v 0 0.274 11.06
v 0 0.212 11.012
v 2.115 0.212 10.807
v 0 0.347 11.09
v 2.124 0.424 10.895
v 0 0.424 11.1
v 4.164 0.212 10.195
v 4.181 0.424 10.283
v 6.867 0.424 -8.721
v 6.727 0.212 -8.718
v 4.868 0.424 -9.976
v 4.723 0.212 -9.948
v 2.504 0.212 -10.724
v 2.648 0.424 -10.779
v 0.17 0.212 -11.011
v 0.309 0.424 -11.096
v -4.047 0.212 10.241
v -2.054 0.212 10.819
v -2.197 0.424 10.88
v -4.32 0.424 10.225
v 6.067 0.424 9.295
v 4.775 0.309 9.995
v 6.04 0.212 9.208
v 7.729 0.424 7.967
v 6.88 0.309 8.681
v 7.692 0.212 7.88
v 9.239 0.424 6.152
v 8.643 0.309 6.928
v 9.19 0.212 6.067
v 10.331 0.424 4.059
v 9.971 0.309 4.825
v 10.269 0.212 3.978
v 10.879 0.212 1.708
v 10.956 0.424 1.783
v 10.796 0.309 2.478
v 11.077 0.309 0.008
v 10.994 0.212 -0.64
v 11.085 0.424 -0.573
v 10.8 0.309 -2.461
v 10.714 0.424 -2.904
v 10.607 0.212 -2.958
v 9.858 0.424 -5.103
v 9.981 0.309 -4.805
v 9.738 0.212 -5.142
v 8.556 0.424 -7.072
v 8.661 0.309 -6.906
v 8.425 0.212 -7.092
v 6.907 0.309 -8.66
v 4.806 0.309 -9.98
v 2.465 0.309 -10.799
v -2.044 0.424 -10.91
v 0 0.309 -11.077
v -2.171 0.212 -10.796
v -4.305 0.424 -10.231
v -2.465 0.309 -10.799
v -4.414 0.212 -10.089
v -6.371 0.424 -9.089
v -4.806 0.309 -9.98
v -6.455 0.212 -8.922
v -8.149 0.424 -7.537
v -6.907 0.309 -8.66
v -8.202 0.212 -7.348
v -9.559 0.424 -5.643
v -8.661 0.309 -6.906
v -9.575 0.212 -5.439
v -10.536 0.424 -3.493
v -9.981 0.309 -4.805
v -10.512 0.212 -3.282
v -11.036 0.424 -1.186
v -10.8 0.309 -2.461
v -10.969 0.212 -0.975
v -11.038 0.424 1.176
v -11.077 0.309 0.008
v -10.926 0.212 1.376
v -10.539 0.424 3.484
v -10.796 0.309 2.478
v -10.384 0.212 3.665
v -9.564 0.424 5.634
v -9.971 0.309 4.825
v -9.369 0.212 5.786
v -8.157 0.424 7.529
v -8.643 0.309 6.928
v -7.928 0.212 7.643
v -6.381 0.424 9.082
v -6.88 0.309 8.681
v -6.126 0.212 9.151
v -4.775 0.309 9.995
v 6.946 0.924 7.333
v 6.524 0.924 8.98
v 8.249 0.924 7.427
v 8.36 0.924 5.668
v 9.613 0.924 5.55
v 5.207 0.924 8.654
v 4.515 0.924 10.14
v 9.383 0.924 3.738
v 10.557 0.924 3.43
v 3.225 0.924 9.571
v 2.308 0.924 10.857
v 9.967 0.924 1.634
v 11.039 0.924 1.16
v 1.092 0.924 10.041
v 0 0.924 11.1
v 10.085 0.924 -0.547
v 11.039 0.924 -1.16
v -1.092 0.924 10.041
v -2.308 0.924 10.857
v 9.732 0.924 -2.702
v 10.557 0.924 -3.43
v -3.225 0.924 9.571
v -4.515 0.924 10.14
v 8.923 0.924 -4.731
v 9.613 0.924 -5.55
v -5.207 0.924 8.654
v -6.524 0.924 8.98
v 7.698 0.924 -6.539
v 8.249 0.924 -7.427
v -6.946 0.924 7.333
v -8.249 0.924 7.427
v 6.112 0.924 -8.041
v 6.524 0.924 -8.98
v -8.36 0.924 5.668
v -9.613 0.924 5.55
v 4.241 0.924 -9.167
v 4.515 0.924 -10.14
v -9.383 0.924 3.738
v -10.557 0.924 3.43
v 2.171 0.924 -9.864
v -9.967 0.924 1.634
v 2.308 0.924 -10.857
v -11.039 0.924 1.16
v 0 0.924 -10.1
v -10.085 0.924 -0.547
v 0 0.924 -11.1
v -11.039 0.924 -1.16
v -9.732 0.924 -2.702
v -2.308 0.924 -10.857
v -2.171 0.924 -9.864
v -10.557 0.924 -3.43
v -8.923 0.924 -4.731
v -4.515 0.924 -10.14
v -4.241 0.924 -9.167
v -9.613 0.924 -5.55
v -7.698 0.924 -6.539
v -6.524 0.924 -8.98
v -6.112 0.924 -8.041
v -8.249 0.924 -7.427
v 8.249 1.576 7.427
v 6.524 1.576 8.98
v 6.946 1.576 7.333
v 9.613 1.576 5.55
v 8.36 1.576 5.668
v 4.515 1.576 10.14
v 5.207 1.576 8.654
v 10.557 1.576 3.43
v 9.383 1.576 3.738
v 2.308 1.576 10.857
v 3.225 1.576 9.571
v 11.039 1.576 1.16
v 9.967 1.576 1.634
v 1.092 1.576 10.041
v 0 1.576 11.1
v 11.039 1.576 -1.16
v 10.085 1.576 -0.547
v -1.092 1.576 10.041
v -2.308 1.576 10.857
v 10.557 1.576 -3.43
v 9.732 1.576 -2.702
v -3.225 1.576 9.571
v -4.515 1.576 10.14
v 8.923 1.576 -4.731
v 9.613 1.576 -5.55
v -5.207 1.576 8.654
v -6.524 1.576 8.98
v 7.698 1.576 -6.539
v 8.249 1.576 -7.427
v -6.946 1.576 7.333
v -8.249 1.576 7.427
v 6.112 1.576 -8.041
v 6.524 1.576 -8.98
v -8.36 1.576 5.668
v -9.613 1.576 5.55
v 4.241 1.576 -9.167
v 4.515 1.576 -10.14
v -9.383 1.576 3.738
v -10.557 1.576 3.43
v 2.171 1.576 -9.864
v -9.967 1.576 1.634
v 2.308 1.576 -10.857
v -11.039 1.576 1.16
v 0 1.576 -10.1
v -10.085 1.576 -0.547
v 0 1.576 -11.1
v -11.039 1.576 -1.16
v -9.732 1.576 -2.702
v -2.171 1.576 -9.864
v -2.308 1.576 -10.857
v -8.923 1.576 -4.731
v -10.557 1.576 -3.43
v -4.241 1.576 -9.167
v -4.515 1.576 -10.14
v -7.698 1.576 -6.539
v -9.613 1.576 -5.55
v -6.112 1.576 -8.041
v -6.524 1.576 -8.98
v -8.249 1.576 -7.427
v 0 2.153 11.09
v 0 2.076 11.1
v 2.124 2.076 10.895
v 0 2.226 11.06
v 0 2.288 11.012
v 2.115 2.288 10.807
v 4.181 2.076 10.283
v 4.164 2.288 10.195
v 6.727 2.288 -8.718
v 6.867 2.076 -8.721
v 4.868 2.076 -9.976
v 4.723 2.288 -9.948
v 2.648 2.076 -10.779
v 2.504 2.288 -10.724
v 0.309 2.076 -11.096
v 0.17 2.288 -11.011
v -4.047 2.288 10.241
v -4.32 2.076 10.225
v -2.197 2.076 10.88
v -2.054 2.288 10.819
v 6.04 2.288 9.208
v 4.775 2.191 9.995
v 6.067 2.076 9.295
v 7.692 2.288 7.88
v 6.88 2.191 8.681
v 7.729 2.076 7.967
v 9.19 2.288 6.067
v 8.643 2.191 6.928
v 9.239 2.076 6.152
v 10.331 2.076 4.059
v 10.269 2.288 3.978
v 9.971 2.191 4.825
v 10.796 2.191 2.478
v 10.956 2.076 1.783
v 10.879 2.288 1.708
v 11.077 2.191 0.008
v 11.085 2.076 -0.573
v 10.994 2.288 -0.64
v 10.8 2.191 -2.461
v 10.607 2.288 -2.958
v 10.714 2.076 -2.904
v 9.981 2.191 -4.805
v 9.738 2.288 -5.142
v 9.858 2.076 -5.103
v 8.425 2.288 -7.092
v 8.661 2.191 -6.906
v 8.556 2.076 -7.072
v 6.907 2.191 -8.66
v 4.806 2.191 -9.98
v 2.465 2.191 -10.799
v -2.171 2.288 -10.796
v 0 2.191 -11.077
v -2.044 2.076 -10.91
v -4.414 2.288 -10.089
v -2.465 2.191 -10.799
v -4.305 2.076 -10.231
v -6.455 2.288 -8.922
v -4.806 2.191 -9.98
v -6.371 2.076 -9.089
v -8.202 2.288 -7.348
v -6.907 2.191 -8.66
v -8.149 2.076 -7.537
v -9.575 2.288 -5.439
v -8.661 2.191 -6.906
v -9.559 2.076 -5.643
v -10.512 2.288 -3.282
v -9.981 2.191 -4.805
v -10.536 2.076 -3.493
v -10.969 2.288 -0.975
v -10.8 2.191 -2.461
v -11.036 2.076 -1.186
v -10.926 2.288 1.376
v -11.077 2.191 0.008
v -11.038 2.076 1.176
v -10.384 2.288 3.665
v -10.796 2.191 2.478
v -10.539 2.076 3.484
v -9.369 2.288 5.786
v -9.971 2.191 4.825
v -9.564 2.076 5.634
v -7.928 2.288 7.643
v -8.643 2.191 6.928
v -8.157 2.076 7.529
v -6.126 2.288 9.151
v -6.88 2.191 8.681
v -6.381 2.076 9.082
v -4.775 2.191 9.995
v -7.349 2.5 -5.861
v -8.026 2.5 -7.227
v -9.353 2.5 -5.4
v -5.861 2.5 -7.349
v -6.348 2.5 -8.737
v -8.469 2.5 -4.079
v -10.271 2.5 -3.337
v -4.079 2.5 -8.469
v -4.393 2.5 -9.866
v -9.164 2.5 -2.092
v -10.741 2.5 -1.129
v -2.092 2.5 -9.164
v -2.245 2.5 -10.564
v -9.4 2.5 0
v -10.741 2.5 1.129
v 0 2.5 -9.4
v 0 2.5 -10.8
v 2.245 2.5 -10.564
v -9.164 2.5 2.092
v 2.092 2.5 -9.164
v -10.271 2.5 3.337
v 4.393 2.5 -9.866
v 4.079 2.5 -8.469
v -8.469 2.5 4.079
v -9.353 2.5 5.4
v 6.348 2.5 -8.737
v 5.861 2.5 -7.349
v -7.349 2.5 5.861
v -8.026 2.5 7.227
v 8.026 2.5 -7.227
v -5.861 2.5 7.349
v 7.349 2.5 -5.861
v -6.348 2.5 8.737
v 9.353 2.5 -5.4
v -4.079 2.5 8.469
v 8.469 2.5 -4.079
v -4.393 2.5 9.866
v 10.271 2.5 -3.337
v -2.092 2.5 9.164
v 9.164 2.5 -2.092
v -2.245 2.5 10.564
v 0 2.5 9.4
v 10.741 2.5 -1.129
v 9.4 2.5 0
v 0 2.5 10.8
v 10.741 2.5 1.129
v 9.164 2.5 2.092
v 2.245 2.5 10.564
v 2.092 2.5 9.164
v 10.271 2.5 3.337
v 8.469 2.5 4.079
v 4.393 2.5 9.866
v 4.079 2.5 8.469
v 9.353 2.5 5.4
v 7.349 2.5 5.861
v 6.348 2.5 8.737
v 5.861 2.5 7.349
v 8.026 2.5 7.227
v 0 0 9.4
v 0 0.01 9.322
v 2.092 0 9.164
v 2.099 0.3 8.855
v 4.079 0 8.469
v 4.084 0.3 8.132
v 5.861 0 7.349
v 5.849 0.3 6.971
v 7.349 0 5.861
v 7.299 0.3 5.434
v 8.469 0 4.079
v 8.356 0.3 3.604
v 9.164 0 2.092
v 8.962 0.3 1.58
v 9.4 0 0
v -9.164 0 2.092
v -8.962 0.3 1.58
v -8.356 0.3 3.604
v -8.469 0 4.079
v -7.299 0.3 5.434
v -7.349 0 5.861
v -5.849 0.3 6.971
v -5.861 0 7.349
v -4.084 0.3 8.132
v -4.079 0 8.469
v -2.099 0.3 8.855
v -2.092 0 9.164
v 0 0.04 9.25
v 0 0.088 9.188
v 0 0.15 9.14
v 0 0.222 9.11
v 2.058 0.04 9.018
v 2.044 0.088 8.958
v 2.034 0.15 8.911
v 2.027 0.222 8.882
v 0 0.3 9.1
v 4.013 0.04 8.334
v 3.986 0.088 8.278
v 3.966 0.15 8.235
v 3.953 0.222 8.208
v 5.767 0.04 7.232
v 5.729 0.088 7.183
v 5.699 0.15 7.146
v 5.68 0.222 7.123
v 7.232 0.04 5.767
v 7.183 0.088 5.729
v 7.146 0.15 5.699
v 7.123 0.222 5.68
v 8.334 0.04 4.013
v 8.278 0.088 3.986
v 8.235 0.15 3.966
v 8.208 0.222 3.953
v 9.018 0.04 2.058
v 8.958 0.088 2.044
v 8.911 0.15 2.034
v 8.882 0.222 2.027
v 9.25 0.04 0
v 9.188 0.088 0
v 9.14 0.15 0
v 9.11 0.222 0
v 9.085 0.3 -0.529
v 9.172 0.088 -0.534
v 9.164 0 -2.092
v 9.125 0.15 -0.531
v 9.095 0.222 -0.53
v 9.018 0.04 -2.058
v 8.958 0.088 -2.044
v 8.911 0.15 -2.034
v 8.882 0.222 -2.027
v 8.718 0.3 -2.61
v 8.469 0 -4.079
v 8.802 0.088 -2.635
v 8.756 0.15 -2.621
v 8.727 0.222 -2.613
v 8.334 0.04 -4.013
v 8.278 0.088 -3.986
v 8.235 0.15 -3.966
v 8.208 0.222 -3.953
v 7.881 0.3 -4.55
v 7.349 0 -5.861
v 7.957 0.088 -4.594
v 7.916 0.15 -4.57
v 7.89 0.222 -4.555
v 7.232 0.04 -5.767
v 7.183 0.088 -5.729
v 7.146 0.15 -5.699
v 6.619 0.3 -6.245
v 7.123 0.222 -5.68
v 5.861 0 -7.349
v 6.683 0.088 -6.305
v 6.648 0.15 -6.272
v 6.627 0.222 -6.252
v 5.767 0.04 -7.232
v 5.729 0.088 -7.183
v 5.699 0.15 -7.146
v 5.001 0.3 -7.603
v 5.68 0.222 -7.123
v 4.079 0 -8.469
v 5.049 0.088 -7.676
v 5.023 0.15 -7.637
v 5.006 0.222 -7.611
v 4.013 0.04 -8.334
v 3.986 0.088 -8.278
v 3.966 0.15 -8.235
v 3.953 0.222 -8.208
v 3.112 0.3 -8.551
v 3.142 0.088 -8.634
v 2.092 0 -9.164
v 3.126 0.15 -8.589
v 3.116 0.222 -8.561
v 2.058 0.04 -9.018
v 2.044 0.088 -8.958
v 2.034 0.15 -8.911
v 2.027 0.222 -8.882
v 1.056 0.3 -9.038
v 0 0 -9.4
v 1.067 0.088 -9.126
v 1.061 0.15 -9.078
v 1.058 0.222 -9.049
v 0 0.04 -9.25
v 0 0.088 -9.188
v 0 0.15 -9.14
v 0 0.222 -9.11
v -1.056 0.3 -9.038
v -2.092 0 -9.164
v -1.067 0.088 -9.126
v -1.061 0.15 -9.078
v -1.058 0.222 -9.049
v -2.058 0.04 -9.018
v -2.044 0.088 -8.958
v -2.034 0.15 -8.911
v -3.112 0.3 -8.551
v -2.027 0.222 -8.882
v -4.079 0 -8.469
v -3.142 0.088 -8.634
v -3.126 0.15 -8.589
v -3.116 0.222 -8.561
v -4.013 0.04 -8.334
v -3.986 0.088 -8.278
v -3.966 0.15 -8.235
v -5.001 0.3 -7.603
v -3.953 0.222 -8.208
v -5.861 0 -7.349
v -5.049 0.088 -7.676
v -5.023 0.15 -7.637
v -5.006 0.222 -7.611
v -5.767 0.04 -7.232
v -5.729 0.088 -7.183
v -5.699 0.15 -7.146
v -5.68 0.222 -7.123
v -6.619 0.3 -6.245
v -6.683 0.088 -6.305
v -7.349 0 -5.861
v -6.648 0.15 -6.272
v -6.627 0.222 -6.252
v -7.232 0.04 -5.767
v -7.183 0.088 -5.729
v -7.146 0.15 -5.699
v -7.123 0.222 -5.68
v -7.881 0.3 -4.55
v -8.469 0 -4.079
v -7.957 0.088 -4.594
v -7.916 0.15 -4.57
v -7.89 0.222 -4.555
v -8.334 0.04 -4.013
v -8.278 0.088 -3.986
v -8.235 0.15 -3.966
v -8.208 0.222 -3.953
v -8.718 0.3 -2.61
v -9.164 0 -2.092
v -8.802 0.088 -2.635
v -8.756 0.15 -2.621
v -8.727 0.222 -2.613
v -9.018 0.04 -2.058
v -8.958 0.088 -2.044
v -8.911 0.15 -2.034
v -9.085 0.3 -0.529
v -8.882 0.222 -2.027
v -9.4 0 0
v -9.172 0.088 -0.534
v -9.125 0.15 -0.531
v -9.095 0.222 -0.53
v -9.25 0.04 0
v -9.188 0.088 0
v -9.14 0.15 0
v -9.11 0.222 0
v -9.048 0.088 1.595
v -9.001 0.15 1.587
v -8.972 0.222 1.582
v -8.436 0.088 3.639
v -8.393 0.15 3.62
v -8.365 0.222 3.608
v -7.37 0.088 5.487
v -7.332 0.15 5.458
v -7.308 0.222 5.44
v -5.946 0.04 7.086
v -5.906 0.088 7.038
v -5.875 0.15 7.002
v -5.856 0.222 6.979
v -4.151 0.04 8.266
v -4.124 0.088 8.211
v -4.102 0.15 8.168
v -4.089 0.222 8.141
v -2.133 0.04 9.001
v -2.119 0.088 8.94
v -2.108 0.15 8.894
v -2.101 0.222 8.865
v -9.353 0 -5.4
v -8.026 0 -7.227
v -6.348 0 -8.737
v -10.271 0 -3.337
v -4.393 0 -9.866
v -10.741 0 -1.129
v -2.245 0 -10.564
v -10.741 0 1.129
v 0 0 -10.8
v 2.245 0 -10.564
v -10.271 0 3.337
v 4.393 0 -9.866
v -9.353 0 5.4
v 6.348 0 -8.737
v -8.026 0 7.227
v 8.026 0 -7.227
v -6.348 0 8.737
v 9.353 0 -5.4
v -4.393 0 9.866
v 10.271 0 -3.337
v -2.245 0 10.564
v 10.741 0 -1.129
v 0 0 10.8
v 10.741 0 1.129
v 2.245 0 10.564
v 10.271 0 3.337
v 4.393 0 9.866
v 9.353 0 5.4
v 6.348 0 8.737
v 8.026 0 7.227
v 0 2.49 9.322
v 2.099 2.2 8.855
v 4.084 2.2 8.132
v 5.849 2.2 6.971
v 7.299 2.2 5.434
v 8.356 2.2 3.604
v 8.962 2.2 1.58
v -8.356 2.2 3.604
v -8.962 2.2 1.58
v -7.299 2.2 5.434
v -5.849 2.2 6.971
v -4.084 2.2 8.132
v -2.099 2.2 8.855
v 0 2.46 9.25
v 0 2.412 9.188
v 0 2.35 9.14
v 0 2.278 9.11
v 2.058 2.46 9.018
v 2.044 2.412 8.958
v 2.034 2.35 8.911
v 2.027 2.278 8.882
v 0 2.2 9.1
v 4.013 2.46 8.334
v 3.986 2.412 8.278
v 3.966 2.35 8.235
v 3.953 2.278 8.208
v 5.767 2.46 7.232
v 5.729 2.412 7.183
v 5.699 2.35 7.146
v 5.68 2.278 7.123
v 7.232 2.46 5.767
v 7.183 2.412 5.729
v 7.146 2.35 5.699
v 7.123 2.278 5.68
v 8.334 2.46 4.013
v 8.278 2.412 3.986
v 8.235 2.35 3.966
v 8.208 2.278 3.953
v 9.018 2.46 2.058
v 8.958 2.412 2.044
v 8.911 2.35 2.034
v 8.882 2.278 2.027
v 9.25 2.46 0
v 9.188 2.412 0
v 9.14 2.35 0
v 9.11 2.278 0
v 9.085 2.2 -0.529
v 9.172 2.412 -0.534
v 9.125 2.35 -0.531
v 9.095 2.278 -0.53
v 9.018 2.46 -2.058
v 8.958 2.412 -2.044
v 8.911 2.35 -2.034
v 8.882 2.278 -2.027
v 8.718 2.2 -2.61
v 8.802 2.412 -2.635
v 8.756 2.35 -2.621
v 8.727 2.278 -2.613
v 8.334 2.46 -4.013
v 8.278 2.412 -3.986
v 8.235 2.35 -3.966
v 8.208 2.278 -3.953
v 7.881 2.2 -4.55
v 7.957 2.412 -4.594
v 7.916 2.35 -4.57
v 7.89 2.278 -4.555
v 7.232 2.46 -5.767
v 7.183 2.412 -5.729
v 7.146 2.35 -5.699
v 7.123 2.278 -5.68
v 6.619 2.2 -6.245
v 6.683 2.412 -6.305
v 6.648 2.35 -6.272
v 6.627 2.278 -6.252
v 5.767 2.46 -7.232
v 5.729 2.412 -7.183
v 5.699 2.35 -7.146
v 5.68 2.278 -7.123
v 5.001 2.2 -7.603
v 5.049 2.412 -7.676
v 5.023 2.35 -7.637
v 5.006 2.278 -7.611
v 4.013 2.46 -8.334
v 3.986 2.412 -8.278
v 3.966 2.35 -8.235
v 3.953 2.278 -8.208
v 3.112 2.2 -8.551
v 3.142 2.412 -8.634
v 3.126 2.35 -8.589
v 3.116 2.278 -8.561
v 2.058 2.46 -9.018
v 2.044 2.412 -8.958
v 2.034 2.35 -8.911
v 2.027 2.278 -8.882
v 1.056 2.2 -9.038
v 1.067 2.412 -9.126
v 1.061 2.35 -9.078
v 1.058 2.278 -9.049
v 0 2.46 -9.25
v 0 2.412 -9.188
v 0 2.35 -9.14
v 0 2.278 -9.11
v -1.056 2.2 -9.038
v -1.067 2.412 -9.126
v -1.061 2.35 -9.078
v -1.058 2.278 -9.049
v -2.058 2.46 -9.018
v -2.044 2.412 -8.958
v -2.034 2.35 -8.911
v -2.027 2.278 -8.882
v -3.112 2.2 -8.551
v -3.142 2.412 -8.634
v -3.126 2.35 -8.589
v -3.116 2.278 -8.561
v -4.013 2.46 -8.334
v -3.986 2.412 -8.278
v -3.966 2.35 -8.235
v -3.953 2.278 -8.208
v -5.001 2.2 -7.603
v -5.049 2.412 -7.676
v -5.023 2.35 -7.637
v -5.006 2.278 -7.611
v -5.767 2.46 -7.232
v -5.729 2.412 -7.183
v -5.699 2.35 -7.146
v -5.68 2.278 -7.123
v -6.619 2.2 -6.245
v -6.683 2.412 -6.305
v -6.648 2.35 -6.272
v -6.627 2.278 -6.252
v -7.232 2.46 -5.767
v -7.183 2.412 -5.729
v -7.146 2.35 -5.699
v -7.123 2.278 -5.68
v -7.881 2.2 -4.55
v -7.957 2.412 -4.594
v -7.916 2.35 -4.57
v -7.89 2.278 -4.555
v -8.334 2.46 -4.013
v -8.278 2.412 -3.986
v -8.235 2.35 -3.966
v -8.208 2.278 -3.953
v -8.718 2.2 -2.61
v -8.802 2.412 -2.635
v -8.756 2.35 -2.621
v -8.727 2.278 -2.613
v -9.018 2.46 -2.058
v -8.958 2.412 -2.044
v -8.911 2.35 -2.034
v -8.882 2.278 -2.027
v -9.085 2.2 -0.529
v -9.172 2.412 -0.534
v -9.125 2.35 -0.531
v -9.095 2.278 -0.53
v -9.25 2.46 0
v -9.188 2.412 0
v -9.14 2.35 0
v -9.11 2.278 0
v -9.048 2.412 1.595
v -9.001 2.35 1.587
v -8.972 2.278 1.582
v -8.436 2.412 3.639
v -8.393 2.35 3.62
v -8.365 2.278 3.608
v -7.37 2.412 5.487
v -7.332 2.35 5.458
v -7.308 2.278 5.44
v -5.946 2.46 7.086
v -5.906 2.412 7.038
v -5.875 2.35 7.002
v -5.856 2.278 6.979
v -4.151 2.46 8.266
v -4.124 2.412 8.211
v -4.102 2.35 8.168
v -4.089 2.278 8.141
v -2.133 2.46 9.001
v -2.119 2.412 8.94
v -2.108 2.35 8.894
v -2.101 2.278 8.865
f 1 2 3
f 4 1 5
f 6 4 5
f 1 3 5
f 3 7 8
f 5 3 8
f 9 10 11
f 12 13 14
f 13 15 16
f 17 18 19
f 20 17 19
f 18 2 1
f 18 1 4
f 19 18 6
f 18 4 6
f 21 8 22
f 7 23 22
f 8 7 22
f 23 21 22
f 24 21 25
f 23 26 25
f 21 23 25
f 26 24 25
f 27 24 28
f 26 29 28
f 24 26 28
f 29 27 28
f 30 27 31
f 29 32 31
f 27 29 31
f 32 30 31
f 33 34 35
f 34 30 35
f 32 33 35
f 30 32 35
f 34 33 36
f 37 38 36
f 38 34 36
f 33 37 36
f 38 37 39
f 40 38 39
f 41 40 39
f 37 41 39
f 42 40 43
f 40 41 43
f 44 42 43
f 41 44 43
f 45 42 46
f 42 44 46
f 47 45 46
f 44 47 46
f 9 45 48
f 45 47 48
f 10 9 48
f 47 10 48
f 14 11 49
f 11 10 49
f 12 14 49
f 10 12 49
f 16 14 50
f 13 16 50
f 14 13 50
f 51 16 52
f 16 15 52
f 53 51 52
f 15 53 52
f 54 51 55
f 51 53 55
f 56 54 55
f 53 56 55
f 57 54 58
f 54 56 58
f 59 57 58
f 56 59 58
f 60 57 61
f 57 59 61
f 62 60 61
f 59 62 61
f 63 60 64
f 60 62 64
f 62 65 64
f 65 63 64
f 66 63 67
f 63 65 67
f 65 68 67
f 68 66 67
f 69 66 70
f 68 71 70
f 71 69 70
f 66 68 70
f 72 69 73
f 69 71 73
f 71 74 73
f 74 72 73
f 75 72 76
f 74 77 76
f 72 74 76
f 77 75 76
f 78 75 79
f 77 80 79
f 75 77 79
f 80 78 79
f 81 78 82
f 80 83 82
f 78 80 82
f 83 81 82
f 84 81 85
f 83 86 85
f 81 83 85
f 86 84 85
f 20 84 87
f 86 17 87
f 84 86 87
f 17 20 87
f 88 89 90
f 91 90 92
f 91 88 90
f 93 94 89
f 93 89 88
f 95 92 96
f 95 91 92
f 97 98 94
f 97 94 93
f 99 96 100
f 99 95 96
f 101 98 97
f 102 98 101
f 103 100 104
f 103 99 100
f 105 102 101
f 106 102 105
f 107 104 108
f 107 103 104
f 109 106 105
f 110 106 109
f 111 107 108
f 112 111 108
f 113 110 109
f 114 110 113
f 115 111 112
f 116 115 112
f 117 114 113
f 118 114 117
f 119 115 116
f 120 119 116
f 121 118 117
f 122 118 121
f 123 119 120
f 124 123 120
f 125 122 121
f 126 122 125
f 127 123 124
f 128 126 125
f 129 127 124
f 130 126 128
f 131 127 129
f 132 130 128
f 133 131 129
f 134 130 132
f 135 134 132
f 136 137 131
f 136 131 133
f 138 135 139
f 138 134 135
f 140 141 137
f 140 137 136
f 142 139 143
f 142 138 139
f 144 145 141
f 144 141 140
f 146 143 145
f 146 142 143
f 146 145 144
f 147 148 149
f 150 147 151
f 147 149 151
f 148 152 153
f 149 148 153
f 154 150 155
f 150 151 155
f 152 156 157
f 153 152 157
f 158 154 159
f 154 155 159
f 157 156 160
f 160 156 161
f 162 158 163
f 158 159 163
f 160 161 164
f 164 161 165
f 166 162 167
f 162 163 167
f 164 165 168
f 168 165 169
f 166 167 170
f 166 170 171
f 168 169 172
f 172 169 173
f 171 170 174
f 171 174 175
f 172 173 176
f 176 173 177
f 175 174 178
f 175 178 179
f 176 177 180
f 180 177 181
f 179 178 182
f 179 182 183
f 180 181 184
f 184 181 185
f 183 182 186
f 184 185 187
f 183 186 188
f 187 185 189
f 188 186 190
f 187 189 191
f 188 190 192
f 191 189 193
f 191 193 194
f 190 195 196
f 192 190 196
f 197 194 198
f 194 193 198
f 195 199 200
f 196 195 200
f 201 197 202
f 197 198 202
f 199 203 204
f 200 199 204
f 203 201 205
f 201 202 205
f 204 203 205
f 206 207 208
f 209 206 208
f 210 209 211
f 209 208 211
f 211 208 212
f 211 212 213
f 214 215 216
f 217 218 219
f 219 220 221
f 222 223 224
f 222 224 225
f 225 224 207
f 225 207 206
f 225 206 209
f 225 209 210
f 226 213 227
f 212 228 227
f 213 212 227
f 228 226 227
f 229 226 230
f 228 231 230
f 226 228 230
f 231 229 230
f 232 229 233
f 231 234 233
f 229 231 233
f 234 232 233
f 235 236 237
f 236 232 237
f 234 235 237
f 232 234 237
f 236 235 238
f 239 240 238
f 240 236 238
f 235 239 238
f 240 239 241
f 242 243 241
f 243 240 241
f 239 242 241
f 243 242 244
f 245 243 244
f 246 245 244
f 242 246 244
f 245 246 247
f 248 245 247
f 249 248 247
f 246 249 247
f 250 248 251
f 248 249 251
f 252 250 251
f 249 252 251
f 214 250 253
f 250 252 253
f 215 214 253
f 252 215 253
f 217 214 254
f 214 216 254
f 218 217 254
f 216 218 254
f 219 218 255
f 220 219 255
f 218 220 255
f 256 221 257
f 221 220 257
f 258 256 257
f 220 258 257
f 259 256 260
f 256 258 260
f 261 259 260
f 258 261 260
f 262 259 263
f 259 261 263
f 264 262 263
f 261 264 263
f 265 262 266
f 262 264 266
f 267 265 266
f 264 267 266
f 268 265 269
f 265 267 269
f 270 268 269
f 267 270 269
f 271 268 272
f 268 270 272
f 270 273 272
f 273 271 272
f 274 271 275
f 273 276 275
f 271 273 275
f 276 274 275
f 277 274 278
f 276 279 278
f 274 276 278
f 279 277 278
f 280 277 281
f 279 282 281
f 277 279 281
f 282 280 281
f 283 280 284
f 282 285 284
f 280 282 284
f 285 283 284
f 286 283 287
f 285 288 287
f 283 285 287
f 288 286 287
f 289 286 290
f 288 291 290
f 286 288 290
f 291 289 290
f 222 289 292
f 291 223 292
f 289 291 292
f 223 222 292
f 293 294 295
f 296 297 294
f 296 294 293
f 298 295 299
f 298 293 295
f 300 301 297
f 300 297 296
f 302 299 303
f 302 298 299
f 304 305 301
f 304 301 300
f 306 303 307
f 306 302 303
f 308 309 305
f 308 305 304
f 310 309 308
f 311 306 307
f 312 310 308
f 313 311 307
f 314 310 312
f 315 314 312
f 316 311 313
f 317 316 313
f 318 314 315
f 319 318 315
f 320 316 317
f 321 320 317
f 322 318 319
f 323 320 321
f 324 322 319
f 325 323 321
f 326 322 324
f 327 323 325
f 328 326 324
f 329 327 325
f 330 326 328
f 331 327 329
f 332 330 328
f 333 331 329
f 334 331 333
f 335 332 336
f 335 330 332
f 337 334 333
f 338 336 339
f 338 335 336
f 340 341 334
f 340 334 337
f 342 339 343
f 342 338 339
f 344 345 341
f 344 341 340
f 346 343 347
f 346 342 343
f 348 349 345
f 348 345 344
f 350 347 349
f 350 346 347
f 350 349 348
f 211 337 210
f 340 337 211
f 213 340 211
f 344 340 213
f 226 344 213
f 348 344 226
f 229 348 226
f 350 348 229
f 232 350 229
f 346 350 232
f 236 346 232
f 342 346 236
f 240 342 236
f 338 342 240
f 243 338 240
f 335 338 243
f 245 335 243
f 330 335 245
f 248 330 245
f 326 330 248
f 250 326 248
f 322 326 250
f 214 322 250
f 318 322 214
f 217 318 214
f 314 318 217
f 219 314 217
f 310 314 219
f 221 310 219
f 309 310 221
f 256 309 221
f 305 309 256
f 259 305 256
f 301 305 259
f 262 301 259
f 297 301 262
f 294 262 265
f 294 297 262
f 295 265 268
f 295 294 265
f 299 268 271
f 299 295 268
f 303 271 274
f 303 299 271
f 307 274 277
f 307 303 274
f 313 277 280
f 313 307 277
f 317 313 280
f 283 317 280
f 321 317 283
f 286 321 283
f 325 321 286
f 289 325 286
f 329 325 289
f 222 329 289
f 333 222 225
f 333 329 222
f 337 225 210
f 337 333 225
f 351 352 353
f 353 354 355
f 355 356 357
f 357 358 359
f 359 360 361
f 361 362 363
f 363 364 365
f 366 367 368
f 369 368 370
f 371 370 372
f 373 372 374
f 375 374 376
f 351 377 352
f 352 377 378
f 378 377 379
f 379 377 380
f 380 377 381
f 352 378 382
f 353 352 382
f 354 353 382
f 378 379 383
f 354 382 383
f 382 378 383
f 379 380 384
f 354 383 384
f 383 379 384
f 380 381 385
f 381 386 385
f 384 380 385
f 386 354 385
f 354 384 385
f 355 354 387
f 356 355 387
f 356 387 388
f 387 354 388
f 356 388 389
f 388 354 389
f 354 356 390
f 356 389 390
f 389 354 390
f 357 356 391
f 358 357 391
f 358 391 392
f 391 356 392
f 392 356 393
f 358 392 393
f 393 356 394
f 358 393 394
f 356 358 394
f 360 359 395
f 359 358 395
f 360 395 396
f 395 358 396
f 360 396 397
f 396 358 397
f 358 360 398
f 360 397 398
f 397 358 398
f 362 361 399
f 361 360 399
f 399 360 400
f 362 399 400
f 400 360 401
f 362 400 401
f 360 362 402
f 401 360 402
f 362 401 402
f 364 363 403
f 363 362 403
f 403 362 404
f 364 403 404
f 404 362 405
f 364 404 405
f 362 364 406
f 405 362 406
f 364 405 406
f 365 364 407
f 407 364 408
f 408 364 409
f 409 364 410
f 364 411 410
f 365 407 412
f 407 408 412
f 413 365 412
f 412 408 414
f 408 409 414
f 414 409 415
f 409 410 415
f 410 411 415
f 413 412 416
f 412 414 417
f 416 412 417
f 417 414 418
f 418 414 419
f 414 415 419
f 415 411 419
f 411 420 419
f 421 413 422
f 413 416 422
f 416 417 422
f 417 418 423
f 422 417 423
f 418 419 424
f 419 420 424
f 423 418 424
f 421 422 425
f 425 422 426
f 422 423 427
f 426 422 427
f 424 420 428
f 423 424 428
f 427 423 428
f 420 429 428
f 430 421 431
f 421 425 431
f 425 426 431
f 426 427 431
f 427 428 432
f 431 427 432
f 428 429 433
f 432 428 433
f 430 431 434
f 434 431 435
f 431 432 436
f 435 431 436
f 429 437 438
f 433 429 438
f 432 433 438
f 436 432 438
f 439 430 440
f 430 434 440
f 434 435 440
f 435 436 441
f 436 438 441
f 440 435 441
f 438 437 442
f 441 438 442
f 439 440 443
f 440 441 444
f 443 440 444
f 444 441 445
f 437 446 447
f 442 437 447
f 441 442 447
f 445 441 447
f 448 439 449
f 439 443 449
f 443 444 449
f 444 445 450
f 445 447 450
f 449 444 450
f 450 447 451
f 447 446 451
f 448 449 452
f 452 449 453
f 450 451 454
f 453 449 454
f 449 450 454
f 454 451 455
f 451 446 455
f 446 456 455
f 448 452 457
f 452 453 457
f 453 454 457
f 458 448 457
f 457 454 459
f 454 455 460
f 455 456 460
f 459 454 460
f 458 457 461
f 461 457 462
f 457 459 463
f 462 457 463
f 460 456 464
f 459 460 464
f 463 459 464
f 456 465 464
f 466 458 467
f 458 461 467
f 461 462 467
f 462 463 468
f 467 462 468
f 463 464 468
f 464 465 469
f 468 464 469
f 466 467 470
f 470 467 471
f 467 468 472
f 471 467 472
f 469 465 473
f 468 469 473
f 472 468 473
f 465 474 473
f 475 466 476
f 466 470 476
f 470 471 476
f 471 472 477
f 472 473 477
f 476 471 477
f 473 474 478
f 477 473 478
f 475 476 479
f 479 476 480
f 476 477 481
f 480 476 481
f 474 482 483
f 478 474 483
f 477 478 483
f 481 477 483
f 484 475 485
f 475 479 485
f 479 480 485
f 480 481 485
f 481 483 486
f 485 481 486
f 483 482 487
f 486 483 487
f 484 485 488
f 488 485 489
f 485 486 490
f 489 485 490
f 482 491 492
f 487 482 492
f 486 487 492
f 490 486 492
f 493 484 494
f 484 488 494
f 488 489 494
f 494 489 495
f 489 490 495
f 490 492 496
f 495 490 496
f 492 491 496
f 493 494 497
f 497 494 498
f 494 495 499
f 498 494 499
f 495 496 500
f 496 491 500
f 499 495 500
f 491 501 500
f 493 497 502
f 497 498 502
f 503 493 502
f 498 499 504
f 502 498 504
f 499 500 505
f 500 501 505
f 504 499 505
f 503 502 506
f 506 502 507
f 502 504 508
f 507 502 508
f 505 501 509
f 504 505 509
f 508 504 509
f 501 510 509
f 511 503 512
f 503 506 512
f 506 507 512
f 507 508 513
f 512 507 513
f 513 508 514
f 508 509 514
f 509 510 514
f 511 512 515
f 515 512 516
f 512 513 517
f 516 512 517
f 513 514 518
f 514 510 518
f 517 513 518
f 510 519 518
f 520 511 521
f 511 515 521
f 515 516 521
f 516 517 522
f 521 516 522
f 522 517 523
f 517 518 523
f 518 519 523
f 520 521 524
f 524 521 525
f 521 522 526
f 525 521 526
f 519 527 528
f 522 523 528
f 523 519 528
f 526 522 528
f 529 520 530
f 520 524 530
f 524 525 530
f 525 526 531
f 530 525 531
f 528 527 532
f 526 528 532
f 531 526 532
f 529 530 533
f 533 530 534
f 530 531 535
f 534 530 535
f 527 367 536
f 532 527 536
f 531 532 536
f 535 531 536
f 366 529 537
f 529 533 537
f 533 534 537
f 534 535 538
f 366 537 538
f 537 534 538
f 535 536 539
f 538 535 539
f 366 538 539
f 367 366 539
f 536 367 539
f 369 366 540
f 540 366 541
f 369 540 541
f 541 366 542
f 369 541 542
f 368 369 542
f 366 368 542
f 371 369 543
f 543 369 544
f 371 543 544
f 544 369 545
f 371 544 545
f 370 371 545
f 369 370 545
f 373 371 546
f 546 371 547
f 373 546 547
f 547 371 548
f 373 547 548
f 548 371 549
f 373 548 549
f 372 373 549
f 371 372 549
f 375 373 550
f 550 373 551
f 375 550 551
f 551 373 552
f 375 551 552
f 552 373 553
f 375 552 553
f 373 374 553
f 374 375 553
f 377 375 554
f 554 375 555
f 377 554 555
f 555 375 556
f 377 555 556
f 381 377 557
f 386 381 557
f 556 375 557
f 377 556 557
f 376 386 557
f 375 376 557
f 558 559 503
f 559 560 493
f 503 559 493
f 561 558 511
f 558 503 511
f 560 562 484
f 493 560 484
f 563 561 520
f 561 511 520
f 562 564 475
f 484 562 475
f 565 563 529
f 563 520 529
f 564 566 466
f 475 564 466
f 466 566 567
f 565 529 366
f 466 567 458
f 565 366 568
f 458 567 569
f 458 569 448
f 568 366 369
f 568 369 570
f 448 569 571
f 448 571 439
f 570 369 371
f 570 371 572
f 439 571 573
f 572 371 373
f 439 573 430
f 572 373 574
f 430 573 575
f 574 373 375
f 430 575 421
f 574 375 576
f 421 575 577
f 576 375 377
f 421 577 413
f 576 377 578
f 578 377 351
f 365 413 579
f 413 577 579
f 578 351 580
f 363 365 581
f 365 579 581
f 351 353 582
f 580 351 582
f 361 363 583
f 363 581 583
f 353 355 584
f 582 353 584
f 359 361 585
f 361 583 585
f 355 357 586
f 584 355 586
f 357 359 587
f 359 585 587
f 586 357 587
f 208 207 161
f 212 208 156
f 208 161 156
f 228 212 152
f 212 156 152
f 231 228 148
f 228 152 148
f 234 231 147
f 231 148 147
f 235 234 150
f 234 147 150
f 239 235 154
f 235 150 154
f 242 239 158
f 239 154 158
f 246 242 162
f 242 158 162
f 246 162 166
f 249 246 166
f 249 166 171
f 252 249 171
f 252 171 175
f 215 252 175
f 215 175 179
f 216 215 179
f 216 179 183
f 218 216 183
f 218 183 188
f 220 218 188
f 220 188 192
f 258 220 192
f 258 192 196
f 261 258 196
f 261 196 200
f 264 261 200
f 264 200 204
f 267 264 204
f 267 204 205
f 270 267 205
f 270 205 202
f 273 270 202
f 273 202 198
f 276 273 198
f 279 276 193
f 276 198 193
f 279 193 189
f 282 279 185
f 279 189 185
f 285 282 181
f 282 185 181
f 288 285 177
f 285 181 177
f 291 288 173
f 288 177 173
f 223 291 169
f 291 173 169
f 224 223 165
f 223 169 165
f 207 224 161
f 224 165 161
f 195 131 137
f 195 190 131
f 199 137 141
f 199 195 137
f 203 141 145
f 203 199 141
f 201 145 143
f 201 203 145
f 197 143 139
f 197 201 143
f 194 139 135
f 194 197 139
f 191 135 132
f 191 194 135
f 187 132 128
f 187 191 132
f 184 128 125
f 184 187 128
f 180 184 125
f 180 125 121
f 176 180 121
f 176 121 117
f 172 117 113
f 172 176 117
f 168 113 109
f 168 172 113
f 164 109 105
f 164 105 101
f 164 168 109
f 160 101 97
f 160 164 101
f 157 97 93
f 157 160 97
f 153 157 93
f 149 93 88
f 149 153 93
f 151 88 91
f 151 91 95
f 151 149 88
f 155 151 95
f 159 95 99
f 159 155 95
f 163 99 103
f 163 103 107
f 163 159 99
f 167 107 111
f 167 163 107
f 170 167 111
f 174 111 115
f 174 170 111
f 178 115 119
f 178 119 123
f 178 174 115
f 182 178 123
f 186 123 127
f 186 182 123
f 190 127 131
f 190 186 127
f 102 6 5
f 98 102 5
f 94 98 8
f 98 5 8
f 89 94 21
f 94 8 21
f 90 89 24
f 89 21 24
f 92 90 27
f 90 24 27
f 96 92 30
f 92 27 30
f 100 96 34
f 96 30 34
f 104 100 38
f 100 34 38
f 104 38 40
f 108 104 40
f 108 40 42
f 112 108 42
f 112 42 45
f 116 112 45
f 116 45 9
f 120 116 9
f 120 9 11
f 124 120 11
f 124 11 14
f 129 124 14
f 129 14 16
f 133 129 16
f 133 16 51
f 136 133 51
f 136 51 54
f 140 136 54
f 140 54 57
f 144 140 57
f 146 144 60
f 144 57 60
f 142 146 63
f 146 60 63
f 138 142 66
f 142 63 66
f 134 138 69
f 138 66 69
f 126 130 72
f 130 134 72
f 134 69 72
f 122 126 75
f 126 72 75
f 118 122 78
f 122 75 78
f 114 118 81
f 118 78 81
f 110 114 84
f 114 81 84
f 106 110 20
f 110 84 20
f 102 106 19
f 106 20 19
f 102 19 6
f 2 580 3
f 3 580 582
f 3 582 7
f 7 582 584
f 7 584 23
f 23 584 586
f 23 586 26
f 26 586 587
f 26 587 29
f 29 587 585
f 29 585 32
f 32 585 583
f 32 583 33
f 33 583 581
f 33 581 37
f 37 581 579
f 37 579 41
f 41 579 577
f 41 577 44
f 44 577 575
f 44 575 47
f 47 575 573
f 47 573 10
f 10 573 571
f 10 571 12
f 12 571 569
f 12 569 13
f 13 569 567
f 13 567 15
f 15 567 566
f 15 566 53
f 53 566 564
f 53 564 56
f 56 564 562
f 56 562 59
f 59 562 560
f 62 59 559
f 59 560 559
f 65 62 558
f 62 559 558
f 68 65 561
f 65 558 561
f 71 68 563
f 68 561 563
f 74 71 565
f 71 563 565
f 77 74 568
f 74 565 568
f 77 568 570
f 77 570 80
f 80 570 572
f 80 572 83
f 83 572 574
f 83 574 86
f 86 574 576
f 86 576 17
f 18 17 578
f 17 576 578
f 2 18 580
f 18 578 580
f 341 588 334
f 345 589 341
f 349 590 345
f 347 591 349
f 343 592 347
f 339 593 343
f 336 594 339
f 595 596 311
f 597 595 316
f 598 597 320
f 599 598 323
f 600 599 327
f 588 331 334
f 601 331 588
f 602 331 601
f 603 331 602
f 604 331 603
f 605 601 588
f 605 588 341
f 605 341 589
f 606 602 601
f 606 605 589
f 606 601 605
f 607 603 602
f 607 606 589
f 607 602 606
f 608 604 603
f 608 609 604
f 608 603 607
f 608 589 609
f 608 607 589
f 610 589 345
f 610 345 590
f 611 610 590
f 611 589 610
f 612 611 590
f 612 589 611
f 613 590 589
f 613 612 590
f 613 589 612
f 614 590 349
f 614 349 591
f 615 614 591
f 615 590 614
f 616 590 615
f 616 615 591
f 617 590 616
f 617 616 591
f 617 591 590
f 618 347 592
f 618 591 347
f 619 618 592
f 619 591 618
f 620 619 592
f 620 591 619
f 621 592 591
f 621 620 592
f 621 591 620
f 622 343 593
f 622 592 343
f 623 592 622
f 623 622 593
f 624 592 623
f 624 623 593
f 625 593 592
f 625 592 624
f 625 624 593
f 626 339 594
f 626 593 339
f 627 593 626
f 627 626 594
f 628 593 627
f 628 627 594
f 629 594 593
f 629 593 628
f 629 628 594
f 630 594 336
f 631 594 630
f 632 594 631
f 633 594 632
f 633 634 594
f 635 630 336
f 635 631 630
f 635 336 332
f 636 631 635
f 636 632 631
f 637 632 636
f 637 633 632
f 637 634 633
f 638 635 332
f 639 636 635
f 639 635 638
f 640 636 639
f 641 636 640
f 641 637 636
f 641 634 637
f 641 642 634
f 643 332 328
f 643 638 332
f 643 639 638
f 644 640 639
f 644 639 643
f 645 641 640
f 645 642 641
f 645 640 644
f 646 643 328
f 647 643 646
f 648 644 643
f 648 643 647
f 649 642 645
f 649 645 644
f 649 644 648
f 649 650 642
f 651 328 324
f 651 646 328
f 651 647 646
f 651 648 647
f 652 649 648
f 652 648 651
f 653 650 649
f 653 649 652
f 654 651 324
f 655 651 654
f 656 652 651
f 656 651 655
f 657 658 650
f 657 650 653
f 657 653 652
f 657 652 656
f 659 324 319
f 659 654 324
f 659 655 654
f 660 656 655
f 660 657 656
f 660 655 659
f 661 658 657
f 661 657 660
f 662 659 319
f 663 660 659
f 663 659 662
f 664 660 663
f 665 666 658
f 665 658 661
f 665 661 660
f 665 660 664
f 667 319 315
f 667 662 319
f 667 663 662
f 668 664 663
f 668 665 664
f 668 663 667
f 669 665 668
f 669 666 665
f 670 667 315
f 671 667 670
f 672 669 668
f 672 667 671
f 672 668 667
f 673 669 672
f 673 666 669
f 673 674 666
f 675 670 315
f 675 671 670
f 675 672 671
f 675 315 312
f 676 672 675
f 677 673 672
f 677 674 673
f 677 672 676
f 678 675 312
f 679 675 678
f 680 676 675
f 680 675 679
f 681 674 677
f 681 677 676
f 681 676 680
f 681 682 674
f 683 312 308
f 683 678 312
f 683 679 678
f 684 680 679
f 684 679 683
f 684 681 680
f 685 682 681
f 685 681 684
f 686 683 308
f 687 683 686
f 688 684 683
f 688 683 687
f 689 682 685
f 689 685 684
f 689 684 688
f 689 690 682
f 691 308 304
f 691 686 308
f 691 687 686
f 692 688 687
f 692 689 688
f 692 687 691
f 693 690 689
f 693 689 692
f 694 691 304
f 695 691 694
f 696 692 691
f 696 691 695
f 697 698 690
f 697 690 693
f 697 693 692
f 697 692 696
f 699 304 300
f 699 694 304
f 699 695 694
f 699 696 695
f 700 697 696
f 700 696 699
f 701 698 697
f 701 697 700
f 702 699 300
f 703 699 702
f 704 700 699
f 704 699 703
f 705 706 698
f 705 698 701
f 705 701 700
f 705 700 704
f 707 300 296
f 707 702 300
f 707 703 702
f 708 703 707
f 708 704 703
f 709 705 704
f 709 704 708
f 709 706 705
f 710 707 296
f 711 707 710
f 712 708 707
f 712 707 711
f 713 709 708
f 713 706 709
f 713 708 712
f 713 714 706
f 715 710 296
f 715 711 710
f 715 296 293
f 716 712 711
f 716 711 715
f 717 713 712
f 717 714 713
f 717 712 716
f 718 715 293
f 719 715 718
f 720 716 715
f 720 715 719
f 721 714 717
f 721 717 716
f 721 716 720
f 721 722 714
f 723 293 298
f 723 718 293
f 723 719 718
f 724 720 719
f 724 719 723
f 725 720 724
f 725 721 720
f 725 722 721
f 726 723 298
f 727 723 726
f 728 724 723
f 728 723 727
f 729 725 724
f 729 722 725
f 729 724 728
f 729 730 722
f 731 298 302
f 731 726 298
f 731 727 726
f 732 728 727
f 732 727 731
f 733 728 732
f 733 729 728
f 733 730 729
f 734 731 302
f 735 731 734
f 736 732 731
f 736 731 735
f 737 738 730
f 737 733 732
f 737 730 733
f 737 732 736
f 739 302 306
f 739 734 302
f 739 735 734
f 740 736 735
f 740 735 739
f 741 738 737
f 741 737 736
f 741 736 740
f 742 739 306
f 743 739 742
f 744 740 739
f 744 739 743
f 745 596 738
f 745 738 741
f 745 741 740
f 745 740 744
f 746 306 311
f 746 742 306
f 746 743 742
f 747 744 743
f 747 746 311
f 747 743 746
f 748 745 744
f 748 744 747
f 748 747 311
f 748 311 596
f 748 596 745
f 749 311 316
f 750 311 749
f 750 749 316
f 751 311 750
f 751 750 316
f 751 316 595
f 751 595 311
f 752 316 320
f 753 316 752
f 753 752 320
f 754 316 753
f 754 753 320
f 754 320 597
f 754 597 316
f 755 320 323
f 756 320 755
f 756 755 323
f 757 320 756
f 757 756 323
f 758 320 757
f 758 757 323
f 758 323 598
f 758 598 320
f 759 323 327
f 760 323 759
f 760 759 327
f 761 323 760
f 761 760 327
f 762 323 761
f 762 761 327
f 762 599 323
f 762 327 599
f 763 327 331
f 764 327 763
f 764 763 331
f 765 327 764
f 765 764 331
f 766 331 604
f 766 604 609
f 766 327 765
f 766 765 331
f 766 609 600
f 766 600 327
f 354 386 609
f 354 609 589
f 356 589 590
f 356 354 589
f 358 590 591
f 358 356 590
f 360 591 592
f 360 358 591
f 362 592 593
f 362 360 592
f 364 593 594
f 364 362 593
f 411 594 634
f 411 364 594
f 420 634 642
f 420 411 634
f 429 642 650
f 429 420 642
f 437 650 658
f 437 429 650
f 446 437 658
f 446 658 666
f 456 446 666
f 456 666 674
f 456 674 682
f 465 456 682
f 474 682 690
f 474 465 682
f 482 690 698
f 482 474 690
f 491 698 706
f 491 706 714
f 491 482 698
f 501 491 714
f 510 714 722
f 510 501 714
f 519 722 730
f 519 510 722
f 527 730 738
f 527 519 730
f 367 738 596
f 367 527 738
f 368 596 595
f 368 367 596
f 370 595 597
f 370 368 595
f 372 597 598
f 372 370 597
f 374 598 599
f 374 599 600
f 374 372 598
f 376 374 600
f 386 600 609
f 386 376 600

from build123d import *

# Parameters (mm, degrees)
SKETCH1_R           = 11.1
SKETCH1_R_2         = 9.1
BOSS_EXTRUDE1_DEPTH = 2.5
CHAMFER1_SIZE       = 0.3
FILLET1_R           = 0.3
FILLET2_R           = 0.3
SKETCH7_W           = 1.941178579
SKETCH7_H           = 0.651471862


with BuildPart() as part:
    # Sketch1 → Boss-Extrude1 (new body)
    with BuildSketch(Plane(origin=(0, 0, 0), x_dir=(1, 0, 0), z_dir=(0, 1, 0))):
        with Locations(Location((0, 0, 0), (0, 0, 270))):
            Circle(SKETCH1_R)
        with Locations(Location((0, 0, 0), (0, 0, 270))):
            Circle(SKETCH1_R_2, mode=Mode.SUBTRACT)
    extrude(amount=BOSS_EXTRUDE1_DEPTH)

    # Chamfer1
    chamfer1_edges = [part.edges().sort_by_distance(p)[0] for p in [
        (0, 0, -11.1),
        (0, 2.5, -11.1),
    ]]
    chamfer(chamfer1_edges, length=CHAMFER1_SIZE)

    # Fillet1
    fillet1_edges = [part.edges().sort_by_distance(p)[0] for p in [
        (0, 0, -9.1),
        (0, 2.5, -9.1),
    ]]
    fillet(fillet1_edges, radius=FILLET1_R)

    # Fillet2
    fillet2_edges = [part.edges().sort_by_distance(p)[0] for p in [
        (0, 0.3, -11.1),
        (0, 2.2, -11.1),
    ]]
    fillet(fillet2_edges, radius=FILLET2_R)

    # Sketch7 → Cut-Revolve3 (revolve, cut)
    with BuildSketch(Plane(origin=(0, 0, 0), x_dir=(0, 0, -1), z_dir=(1, 0, 0)), mode=Mode.PRIVATE) as cut_revolve3_sk:
        with Locations((-11.07058929, 1.25)):
            Rectangle(SKETCH7_W, SKETCH7_H)
    revolve(cut_revolve3_sk.sketch.rotate(Axis((0, -4.292585454, 0), (0, 1, 0)), 180), axis=Axis((0, -4.292585454, 0), (0, 1, 0)), mode=Mode.SUBTRACT)


solid = part.part
